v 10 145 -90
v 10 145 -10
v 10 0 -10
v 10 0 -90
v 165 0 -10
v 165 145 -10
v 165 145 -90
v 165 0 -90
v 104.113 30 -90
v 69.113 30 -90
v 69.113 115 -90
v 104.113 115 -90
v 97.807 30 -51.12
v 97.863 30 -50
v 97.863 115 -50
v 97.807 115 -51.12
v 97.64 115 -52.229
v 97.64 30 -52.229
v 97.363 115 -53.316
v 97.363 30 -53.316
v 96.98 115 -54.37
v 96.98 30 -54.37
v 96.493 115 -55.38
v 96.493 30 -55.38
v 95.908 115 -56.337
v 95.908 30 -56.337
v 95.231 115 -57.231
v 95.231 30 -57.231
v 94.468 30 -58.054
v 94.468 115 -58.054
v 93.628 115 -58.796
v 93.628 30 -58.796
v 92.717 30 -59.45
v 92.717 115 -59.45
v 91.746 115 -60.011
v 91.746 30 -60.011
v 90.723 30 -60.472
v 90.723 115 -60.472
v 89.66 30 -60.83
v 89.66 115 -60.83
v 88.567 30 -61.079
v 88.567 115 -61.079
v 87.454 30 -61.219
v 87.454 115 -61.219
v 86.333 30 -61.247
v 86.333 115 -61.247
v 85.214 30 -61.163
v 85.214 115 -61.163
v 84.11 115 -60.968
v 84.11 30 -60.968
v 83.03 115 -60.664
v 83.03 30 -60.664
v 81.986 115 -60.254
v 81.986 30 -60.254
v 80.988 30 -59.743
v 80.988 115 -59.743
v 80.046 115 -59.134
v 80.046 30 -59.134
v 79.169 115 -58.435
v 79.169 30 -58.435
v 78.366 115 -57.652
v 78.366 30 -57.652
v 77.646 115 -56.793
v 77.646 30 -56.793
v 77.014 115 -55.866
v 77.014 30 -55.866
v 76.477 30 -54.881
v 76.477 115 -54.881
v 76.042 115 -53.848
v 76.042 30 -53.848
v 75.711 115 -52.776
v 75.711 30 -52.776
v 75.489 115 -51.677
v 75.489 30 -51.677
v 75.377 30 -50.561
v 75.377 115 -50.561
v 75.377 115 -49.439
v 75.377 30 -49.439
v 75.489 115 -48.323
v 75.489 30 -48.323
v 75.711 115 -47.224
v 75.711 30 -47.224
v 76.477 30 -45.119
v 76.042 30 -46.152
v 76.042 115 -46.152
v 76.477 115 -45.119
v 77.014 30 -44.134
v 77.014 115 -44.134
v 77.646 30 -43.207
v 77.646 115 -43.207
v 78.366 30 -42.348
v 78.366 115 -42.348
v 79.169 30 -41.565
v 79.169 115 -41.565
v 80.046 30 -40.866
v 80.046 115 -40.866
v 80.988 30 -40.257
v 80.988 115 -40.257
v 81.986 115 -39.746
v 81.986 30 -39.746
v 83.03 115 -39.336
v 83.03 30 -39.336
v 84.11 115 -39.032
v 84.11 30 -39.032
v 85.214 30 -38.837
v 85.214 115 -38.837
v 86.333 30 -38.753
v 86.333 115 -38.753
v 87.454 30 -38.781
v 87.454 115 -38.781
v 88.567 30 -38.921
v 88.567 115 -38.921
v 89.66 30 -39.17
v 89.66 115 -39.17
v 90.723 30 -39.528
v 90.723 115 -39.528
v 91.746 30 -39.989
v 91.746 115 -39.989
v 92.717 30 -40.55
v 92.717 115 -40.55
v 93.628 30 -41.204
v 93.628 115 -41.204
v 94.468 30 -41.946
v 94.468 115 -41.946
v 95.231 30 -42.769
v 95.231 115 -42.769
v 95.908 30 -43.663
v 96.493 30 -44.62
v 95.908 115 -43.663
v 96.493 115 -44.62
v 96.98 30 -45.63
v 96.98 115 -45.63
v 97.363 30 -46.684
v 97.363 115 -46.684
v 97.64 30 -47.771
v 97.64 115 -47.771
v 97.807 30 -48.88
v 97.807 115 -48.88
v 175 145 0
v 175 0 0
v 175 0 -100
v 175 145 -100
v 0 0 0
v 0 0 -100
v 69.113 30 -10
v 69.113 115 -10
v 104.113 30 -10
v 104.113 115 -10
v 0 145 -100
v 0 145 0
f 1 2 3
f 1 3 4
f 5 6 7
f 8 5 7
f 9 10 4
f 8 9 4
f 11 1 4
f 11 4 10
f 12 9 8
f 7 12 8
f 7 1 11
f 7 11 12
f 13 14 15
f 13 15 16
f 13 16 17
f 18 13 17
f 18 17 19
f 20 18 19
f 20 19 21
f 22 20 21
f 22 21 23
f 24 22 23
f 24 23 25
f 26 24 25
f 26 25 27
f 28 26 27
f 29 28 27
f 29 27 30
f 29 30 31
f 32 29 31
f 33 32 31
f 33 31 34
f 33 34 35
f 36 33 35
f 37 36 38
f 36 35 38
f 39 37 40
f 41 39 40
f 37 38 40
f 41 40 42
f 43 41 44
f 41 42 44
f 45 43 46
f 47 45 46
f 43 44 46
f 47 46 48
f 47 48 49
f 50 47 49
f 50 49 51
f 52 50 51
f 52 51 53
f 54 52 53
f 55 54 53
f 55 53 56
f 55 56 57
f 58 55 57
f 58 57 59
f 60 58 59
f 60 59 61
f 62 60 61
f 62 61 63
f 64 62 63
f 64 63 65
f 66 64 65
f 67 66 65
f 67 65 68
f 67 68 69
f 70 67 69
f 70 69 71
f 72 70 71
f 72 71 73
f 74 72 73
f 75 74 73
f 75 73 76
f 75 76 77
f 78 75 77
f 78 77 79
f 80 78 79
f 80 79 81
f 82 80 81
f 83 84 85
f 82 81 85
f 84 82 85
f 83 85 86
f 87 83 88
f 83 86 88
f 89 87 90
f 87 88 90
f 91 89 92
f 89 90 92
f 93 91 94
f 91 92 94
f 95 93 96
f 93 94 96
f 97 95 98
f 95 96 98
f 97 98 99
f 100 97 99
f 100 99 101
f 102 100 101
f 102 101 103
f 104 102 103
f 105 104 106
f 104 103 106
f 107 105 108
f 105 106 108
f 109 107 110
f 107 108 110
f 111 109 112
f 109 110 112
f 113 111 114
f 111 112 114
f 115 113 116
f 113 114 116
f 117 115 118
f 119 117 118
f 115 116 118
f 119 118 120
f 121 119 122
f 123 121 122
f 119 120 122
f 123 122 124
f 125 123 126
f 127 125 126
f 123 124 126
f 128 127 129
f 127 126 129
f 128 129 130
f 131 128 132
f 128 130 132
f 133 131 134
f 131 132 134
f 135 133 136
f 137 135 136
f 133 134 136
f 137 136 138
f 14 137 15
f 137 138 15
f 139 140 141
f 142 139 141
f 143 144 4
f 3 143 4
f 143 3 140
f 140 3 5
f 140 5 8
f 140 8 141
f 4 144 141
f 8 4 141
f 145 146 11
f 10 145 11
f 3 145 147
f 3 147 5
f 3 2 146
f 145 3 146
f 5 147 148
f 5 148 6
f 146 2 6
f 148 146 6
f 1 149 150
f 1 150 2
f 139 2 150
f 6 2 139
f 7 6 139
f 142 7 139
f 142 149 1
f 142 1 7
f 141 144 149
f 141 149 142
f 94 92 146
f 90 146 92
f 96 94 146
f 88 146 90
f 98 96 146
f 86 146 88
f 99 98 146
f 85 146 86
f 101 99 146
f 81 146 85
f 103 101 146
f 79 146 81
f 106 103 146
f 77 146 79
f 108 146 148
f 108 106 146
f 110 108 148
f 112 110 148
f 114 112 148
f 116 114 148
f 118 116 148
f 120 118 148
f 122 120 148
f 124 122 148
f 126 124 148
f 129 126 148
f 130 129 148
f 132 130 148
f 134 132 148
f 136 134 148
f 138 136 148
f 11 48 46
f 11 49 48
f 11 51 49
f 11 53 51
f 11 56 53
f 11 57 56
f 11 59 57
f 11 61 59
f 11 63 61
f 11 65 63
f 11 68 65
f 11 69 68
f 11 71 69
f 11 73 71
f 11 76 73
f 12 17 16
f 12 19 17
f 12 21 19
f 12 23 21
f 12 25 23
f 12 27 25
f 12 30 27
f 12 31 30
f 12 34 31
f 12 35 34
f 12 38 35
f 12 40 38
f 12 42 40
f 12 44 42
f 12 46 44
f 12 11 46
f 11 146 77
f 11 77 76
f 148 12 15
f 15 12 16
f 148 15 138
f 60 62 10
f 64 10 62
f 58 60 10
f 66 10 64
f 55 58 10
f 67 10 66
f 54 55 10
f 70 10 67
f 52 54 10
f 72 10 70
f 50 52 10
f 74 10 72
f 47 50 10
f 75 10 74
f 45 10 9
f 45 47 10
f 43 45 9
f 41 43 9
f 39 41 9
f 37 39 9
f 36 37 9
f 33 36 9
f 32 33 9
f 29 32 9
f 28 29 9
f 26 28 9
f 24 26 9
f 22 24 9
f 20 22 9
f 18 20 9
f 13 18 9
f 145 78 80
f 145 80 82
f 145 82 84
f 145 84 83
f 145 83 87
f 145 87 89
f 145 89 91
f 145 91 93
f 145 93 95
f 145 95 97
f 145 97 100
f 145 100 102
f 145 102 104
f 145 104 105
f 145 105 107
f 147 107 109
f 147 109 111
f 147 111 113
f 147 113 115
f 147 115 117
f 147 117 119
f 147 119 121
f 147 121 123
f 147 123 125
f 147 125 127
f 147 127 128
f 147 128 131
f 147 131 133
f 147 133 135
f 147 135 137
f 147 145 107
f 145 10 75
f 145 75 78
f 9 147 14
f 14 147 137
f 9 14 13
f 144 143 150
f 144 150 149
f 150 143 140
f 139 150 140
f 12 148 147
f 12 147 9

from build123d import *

# Parameters (mm, degrees)
SKETCH1_W           = 175
SKETCH1_H           = 100
BOSS_EXTRUDE1_DEPTH = 145
SKETCH2_R           = 11.25
SKETCH2_W           = 59.113281673
SKETCH2_H           = 80
SKETCH2_W_2         = 60.886718327
CUT_EXTRUDE1_DEPTH  = 145
SKETCH4_W           = 35
SKETCH4_H           = 80
CUT_EXTRUDE2_DEPTH  = 30
SKETCH5_W           = 35
SKETCH5_H           = 80
CUT_EXTRUDE3_DEPTH  = 30


with BuildPart() as part:
    # Sketch1 → Boss-Extrude1 (new body)
    with BuildSketch(Plane(origin=(0, 0, 0), x_dir=(1, 0, 0), z_dir=(0, 1, 0))):
        with Locations((87.5, 50)):
            Rectangle(SKETCH1_W, SKETCH1_H)
    extrude(amount=BOSS_EXTRUDE1_DEPTH)

    # Sketch2 → Cut-Extrude1 (cut)
    with BuildSketch(Plane(origin=(0, 145, 0), x_dir=(1, 0, 0), z_dir=(0, 1, 0))):
        with Locations((86.613281673, 50)):
            Circle(SKETCH2_R)
        with Locations((39.556640837, 50)):
            Rectangle(SKETCH2_W, SKETCH2_H)
        with Locations((134.556640837, 50)):
            Rectangle(SKETCH2_W_2, SKETCH2_H)
    extrude(amount=-CUT_EXTRUDE1_DEPTH, mode=Mode.SUBTRACT)

    # Sketch4 → Cut-Extrude2 (cut)
    with BuildSketch(Plane(origin=(0, 145, 0), x_dir=(1, 0, 0), z_dir=(0, 1, 0))):
        with Locations((86.613281673, 50)):
            Rectangle(SKETCH4_W, SKETCH4_H)
    extrude(amount=-CUT_EXTRUDE2_DEPTH, mode=Mode.SUBTRACT)

    # Sketch5 → Cut-Extrude3 (cut)
    with BuildSketch(Plane.XZ):
        with Locations((86.613281673, -50)):
            Rectangle(SKETCH5_W, SKETCH5_H)
    extrude(amount=-CUT_EXTRUDE3_DEPTH, mode=Mode.SUBTRACT)


solid = part.part
